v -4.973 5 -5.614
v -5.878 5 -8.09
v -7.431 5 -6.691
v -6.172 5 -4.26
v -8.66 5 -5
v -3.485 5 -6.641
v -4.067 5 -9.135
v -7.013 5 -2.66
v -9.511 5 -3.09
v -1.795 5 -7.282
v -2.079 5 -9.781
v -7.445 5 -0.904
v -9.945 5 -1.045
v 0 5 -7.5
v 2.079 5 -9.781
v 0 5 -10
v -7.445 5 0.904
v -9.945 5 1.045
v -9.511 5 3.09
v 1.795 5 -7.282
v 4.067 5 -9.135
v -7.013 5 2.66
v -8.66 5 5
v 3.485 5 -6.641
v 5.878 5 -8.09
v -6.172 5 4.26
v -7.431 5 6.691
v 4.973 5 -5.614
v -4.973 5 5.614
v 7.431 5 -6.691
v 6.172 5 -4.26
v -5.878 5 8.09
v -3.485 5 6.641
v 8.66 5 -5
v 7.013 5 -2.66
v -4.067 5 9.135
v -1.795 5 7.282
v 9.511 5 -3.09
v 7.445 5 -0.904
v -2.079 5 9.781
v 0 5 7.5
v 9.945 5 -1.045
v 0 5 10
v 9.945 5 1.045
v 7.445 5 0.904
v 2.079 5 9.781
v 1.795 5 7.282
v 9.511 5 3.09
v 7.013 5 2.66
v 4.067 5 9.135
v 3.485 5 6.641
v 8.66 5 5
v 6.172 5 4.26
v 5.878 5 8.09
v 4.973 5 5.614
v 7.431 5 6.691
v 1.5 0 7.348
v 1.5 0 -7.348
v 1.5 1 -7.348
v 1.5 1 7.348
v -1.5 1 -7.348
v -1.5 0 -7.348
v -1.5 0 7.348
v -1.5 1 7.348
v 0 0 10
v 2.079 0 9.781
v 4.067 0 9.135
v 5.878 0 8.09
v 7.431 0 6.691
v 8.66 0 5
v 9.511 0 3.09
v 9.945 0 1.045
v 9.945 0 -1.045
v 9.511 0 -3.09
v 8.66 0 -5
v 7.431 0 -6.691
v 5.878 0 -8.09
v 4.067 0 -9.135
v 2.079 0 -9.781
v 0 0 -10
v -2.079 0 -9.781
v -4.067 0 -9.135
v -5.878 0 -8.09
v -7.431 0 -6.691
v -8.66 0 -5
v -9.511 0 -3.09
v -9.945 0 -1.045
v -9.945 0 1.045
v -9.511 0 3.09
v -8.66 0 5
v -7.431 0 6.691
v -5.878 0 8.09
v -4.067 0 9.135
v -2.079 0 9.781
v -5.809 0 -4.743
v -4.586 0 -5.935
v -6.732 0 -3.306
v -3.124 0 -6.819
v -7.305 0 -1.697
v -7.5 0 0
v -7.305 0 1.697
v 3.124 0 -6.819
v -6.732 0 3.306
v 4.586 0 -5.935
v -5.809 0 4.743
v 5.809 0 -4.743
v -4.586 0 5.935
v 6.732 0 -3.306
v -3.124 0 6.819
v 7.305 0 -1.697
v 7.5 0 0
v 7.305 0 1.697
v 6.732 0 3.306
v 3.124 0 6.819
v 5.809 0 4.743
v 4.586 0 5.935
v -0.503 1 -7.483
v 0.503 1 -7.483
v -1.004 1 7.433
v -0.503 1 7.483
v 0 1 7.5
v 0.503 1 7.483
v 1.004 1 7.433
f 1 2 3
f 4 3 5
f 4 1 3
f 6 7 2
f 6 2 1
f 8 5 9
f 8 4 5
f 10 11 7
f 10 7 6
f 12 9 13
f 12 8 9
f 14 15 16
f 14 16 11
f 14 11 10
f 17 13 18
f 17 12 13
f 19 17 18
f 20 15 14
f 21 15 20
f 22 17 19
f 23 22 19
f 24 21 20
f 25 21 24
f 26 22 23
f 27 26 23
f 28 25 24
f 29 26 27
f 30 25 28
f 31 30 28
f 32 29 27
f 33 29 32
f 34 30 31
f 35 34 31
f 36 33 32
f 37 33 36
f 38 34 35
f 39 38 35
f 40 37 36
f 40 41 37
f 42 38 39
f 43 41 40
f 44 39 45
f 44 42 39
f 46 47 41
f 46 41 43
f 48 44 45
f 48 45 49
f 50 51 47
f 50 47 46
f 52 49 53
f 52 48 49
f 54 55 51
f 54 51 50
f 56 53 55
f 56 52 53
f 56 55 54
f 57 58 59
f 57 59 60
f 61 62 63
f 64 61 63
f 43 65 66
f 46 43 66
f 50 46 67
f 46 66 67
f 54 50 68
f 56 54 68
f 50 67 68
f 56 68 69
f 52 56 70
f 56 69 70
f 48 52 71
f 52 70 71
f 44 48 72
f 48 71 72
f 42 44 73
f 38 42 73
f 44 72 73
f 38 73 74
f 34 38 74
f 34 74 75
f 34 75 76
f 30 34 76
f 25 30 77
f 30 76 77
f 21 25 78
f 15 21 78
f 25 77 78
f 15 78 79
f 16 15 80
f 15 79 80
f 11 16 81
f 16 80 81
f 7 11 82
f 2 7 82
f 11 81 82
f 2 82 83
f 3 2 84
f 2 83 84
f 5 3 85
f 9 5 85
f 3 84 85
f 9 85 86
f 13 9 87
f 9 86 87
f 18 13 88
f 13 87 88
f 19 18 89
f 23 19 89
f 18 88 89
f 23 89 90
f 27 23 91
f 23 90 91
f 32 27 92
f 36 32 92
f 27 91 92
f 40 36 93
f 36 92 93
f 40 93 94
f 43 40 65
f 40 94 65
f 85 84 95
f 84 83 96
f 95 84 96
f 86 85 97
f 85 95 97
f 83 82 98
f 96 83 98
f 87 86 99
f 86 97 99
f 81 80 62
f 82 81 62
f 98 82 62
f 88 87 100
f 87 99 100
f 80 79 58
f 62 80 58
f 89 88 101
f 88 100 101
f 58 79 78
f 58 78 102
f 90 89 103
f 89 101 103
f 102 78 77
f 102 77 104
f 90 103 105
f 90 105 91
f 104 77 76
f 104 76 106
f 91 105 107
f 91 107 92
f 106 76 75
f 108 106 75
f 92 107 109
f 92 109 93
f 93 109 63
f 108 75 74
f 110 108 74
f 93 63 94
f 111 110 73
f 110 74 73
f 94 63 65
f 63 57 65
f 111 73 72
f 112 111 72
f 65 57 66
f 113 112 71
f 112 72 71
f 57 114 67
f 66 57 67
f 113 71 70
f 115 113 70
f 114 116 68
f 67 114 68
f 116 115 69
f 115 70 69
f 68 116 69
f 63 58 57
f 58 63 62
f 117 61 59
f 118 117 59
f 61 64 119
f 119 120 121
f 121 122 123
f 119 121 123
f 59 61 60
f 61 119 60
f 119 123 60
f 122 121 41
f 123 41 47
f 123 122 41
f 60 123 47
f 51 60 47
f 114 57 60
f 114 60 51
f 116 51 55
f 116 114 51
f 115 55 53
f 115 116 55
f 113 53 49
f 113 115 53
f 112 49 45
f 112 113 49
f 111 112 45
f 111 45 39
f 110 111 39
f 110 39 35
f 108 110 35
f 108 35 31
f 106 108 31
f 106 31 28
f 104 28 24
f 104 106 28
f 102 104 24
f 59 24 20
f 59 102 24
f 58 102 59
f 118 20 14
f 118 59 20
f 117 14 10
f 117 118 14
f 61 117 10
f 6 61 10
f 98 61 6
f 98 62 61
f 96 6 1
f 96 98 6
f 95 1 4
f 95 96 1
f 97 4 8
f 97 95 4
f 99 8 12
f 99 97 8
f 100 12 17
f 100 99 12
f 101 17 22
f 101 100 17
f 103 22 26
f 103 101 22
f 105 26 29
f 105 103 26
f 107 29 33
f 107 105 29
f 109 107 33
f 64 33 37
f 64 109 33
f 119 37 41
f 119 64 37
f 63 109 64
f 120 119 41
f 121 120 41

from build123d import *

# Parameters (mm, degrees)
SKETCH1_R           = 10
SKETCH1_R_2         = 7.5
BOSS_EXTRUDE1_DEPTH = 5
SKETCH2_W           = 3
SKETCH2_H           = 15
BOSS_EXTRUDE2_DEPTH = 1


with BuildPart() as part:
    # Sketch1 → Boss-Extrude1 (new body)
    with BuildSketch(Plane(origin=(0, 0, 0), x_dir=(1, 0, 0), z_dir=(0, 1, 0))):
        with Locations(Location((0, 0, 0), (0, 0, 270))):
            Circle(SKETCH1_R)
        with Locations(Location((0, 0, 0), (0, 0, 270))):
            Circle(SKETCH1_R_2, mode=Mode.SUBTRACT)
    extrude(amount=BOSS_EXTRUDE1_DEPTH)

    # Sketch2 → Boss-Extrude2 (add)
    with BuildSketch(Plane.XZ):
        Rectangle(SKETCH2_W, SKETCH2_H)
    extrude(amount=-BOSS_EXTRUDE2_DEPTH)


solid = part.part
